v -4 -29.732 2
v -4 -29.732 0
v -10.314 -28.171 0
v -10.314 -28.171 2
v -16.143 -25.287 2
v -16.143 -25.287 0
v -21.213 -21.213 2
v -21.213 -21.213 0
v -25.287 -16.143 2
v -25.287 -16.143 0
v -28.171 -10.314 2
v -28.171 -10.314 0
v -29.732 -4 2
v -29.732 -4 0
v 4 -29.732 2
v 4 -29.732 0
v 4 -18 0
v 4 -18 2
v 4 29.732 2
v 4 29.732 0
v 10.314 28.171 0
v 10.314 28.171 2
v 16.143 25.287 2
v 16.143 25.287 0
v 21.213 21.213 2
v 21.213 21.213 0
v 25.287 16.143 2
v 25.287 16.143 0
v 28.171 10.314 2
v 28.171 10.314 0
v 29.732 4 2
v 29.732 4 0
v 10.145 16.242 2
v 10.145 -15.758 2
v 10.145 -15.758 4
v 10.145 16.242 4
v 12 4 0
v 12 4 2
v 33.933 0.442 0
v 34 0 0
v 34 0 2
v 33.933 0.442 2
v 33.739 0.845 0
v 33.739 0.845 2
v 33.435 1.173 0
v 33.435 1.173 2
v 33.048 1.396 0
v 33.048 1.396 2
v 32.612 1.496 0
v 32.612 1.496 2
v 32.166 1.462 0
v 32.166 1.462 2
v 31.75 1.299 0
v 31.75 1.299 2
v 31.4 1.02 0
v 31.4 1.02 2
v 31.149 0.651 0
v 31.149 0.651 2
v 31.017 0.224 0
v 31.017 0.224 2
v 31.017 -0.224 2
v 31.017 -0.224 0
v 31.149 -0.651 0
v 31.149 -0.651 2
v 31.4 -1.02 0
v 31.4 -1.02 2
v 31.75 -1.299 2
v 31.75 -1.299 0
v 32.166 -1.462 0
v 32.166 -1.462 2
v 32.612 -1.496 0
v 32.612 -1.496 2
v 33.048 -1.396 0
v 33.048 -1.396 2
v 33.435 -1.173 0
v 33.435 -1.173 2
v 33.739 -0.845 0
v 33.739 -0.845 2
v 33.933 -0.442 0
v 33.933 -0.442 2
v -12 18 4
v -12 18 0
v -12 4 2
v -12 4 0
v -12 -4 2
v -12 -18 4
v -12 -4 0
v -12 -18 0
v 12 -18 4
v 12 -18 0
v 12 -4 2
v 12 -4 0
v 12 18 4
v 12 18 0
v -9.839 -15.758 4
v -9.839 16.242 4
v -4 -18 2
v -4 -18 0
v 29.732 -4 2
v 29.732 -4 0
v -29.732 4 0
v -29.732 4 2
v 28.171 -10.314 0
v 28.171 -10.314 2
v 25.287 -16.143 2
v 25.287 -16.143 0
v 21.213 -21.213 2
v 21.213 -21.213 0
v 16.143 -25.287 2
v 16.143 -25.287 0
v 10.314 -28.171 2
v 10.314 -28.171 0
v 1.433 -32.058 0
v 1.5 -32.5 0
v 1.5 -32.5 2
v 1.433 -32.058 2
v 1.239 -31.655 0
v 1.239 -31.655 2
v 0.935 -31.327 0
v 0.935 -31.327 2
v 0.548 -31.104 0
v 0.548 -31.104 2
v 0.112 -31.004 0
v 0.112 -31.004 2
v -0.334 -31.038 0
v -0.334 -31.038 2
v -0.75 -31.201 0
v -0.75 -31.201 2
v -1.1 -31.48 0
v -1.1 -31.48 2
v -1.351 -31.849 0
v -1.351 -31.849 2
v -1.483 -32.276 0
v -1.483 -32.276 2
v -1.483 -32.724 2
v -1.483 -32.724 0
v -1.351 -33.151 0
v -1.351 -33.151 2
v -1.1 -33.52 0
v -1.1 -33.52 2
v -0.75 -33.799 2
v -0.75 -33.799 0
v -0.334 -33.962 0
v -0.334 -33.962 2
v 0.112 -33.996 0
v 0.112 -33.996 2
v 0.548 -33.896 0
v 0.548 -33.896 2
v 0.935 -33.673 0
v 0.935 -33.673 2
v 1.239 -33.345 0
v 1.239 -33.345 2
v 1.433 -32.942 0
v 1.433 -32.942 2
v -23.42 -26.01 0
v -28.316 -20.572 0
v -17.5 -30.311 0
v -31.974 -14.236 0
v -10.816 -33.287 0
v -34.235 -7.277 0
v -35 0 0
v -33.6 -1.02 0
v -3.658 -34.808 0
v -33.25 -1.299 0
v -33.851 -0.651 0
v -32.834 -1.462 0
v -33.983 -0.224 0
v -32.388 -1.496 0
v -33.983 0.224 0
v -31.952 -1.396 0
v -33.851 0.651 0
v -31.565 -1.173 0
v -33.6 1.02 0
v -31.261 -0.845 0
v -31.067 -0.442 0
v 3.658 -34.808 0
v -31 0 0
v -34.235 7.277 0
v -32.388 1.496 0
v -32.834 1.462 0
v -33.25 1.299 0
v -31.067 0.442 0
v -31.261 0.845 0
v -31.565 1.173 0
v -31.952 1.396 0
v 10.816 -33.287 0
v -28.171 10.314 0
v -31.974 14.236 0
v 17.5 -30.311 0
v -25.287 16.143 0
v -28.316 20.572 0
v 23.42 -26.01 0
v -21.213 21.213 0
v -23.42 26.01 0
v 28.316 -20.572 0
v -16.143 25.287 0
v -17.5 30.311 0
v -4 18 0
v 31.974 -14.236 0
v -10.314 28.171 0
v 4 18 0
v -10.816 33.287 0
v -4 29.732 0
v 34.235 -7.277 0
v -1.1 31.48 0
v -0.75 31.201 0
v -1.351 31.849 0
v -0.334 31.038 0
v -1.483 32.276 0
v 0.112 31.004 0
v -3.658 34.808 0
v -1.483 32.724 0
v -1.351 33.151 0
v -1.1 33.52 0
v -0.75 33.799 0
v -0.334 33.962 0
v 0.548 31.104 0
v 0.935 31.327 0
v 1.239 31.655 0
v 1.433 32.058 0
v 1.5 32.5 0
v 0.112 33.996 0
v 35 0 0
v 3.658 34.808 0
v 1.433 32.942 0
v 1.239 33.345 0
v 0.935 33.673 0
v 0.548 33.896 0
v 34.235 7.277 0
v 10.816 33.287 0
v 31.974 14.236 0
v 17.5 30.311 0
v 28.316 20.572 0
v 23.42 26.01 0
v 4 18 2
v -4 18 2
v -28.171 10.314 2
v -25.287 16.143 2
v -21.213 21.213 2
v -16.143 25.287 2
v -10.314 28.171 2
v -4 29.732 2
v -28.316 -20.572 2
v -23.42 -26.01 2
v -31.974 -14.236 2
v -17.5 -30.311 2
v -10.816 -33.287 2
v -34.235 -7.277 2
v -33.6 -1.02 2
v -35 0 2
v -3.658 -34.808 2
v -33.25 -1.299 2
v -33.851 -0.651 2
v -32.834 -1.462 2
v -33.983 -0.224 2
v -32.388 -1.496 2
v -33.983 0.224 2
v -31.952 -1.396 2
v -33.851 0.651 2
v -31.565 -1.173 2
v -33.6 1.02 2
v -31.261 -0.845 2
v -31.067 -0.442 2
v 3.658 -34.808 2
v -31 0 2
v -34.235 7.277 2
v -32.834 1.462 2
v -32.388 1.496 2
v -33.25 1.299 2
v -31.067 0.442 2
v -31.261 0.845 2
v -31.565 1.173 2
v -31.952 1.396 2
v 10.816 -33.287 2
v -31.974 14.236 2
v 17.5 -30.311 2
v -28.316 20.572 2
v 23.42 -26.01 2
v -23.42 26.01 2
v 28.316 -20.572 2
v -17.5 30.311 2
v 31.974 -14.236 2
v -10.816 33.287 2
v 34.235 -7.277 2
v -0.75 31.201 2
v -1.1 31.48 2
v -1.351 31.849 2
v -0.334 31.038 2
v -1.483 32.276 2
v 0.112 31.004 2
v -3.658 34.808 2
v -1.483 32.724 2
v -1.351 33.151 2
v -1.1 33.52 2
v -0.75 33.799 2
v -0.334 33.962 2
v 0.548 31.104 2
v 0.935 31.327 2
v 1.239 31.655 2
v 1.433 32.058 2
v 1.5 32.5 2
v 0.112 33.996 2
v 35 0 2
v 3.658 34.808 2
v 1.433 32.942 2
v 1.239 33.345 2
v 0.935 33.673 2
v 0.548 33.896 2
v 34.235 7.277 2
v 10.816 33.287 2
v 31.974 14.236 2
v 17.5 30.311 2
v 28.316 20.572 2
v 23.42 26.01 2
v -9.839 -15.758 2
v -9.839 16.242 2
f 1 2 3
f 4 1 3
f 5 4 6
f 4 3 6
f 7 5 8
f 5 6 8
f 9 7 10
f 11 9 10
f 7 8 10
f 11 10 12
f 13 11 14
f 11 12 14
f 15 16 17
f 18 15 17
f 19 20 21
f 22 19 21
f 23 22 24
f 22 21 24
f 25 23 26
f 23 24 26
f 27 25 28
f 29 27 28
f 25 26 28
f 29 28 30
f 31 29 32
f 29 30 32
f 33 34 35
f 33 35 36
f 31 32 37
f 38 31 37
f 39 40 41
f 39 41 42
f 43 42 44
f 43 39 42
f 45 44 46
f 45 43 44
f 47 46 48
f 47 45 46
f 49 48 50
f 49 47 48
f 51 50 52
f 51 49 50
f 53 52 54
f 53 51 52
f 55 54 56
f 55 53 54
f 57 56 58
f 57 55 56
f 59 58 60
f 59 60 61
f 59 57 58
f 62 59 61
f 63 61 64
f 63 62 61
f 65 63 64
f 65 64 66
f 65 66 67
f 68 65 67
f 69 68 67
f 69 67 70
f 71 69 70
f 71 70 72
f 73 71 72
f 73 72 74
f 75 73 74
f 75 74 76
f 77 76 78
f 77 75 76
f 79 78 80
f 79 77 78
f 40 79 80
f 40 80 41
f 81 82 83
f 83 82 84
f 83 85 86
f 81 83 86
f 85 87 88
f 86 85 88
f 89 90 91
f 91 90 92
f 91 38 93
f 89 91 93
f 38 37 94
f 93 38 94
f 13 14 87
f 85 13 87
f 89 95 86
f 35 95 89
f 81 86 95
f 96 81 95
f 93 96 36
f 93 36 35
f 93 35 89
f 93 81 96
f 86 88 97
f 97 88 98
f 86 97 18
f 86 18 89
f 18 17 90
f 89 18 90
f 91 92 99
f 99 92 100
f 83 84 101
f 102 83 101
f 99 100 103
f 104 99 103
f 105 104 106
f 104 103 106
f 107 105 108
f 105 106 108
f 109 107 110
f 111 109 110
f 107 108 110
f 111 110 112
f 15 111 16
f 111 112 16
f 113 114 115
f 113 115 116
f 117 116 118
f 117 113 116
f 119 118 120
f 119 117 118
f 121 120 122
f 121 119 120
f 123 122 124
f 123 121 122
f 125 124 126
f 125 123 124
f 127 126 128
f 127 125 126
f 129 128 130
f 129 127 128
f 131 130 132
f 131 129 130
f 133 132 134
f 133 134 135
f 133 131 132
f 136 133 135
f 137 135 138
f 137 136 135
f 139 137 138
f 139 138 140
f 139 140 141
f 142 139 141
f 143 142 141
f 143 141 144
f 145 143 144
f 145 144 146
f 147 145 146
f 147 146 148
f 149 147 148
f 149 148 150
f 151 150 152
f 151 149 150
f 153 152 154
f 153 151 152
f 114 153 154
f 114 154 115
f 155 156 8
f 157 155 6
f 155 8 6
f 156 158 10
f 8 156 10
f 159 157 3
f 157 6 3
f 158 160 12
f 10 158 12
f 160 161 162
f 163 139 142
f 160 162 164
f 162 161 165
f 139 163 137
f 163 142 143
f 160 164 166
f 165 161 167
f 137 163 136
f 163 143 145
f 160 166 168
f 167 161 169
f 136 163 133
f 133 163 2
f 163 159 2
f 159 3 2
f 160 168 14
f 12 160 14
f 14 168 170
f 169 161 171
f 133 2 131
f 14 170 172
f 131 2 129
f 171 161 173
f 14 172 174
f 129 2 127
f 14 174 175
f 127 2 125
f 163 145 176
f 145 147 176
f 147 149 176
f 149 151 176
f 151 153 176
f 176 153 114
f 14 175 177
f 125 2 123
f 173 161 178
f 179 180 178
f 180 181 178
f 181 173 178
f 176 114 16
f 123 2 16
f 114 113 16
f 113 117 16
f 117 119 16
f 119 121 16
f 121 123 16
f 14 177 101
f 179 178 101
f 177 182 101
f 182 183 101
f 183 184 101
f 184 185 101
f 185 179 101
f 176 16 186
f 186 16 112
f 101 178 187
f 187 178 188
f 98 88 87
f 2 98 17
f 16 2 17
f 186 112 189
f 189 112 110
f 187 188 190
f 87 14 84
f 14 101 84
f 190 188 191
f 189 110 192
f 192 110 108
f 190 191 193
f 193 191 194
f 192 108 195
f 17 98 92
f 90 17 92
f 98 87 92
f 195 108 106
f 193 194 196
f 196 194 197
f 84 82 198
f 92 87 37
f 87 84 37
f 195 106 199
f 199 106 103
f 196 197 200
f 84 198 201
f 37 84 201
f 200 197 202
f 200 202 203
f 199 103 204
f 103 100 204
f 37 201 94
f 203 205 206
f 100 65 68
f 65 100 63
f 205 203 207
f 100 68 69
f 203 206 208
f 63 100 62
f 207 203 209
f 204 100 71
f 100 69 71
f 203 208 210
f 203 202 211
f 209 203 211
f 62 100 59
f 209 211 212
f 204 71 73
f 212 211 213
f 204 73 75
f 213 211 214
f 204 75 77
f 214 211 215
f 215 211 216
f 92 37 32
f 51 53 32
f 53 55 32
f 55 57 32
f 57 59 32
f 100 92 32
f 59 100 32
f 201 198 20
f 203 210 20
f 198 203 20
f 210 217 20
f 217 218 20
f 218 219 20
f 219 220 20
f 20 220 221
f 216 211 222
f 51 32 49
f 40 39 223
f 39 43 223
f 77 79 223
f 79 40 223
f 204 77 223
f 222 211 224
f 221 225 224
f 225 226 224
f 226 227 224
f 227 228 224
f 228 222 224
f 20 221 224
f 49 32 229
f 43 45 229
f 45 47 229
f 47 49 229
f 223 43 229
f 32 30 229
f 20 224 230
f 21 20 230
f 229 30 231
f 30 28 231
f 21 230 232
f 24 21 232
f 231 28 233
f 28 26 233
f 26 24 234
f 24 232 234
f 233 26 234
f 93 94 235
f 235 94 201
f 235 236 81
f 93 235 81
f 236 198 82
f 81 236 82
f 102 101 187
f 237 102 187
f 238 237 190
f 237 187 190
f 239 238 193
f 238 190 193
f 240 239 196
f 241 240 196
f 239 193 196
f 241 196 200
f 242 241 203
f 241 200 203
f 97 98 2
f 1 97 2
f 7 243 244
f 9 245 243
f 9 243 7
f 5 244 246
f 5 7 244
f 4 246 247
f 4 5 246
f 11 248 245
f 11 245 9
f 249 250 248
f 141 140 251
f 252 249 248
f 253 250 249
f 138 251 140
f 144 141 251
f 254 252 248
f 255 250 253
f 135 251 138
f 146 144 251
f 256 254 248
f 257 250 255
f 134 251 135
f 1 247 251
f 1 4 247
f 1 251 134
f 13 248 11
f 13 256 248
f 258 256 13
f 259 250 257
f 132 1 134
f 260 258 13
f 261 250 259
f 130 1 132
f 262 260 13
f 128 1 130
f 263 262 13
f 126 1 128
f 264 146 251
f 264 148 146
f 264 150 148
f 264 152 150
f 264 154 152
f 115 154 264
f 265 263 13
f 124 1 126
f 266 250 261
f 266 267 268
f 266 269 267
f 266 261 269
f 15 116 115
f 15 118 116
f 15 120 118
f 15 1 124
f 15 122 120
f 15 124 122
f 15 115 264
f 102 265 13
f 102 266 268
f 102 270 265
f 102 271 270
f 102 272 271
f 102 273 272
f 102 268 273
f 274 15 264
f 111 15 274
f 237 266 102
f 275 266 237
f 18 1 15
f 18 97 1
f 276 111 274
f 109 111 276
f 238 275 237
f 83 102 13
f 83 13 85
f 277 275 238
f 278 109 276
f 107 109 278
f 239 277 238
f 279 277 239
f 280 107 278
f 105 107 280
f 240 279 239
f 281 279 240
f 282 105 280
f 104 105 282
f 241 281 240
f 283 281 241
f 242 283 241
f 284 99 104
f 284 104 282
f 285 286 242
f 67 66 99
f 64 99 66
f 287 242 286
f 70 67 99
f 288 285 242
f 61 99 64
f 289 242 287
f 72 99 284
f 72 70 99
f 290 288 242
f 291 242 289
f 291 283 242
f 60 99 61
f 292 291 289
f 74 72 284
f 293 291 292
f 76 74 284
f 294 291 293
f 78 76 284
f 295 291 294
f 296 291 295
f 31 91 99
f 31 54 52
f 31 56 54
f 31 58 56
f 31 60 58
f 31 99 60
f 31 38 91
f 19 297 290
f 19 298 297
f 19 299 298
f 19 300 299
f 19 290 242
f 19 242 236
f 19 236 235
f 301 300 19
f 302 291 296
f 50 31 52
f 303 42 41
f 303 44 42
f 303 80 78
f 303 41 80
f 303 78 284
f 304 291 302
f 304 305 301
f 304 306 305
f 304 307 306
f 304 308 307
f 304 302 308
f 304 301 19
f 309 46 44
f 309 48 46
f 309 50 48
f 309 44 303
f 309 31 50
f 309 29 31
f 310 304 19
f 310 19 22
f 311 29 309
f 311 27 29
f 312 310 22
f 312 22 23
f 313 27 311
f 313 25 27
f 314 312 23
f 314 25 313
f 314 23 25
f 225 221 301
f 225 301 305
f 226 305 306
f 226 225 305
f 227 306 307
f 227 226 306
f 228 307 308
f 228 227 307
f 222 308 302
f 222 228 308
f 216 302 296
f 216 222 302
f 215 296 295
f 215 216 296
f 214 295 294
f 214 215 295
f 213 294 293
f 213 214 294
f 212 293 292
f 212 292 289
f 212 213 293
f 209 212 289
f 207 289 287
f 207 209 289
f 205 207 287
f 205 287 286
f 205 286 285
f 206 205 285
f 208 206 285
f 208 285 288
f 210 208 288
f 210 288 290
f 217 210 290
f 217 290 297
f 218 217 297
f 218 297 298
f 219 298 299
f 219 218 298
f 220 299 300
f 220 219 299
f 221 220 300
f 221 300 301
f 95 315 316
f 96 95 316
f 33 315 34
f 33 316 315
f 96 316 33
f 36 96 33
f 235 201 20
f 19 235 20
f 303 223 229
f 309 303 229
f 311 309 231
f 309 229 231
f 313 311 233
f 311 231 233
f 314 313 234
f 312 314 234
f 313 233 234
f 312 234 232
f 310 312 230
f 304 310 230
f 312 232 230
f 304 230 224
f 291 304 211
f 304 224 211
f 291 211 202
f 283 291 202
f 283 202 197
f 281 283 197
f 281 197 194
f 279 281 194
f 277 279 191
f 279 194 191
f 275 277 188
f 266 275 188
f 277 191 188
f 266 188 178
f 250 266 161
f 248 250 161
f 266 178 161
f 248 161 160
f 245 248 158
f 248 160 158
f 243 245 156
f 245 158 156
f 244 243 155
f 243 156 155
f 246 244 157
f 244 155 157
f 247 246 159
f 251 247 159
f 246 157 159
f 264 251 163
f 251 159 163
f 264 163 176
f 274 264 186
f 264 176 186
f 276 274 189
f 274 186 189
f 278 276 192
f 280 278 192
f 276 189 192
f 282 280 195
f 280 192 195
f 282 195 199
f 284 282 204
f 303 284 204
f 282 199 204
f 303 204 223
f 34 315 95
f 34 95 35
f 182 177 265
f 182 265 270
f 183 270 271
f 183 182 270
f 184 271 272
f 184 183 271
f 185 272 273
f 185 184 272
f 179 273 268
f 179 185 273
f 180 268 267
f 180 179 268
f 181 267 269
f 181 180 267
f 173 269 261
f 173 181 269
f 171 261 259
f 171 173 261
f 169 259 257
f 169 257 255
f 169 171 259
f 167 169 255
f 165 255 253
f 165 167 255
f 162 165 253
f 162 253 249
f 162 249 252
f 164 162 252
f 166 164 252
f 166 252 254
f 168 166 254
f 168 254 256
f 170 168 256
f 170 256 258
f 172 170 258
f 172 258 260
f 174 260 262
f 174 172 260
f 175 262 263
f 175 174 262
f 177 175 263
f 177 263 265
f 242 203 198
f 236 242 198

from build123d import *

# Parameters (mm, degrees)
F0_R     = 35
F0_R_2   = 1.5
F0_W     = 19.983293198
F0_H     = 32
F1_DEPTH = 2
F2_DEPTH = 4


# Not quite as in the source:
# - a feature names something its author has since deleted; it is built from what else it names


with BuildPart() as f1:
    # F0 (on Top) → F1 (new body)
    with BuildSketch(Plane.XY):
        Circle(F0_R)
        with Locations((0, -32.5)):
            Circle(F0_R_2, mode=Mode.SUBTRACT)
        with Locations((-32.5, 0)):
            Circle(F0_R_2, mode=Mode.SUBTRACT)
        with BuildLine():
            ThreePointArc((29.7321374946, 4), (29.9329594664, 2.0044793789), (30, 0))
            ThreePointArc((30, 0), (29.9329594664, -2.0044793789), (29.7321374946, -4))
            ThreePointArc((29.7321374946, -4), (21.2132034356, -21.2132034356), (4, -29.7321374946))
            ThreePointArc((4, -29.7321374946), (0, -30), (-4, -29.7321374946))
            ThreePointArc((-4, -29.7321374946), (-21.2132034356, -21.2132034356), (-29.7321374946, -4))
            ThreePointArc((-29.7321374946, -4), (-30, 0), (-29.7321374946, 4))
            ThreePointArc((-29.7321374946, 4), (-21.2132034356, 21.2132034356), (-4, 29.7321374946))
            ThreePointArc((-4, 29.7321374946), (0, 30), (4, 29.7321374946))
            ThreePointArc((4, 29.7321374946), (21.2132034356, 21.2132034356), (29.7321374946, 4))
        make_face(mode=Mode.SUBTRACT)
        with Locations((32.5, 0)):
            Circle(F0_R_2, mode=Mode.SUBTRACT)
        with Locations((0, 32.5)):
            Circle(F0_R_2, mode=Mode.SUBTRACT)
        with BuildLine():
            Line((4, 18), (4, 29.7321374946))
            ThreePointArc((4, 29.7321374946), (0, 30), (-4, 29.7321374946))
            Line((-4, 29.7321374946), (-4, 18))
            Line((-4, 18), (4, 18))
        make_face()
        with BuildLine():
            Line((-12, 4), (-29.7321374946, 4))
            ThreePointArc((-29.7321374946, 4), (-30, 0), (-29.7321374946, -4))
            Line((-29.7321374946, -4), (-12, -4))
            Line((-12, -4), (-12, 4))
        make_face()
        with BuildLine():
            ThreePointArc((-4, -29.7321374946), (0, -30), (4, -29.7321374946))
            Line((4, -29.7321374946), (4, -18))
            Line((4, -18), (-4, -18))
            Line((-4, -18), (-4, -29.7321374946))
        make_face()
        Polygon((12, -4), (12, 4), (12, 12.1005004627), (12, 18), (4, 18), (-4, 18), (-12, 18), (-12, 4), (-12, -4), (-12, -18), (-4, -18), (4, -18), (12, -18), (12, -5.151443038), align=None)
        with Locations((0.1530251862, 0.242334145)):
            Rectangle(F0_W, F0_H, mode=Mode.SUBTRACT)
        with Locations((0.1530251862, 0.242334145)):
            Rectangle(F0_W, F0_H)
        with BuildLine():
            ThreePointArc((29.7321374946, -4), (29.9329594664, -2.0044793789), (30, 0))
            ThreePointArc((30, 0), (29.9329594664, 2.0044793789), (29.7321374946, 4))
            Line((29.7321374946, 4), (12, 4))
            Line((12, 4), (12, -4))
            Line((12, -4), (29.7321374946, -4))
        make_face()
    extrude(amount=F1_DEPTH)

    # F0 (on Top) → F2 (join)
    with BuildSketch(Plane.XY):
        Polygon((12, -4), (12, 4), (12, 12.1005004627), (12, 18), (4, 18), (-4, 18), (-12, 18), (-12, 4), (-12, -4), (-12, -18), (-4, -18), (4, -18), (12, -18), (12, -5.151443038), align=None)
        with Locations((0.1530251862, 0.242334145)):
            Rectangle(F0_W, F0_H, mode=Mode.SUBTRACT)
    extrude(amount=F2_DEPTH)


solid = f1.part
